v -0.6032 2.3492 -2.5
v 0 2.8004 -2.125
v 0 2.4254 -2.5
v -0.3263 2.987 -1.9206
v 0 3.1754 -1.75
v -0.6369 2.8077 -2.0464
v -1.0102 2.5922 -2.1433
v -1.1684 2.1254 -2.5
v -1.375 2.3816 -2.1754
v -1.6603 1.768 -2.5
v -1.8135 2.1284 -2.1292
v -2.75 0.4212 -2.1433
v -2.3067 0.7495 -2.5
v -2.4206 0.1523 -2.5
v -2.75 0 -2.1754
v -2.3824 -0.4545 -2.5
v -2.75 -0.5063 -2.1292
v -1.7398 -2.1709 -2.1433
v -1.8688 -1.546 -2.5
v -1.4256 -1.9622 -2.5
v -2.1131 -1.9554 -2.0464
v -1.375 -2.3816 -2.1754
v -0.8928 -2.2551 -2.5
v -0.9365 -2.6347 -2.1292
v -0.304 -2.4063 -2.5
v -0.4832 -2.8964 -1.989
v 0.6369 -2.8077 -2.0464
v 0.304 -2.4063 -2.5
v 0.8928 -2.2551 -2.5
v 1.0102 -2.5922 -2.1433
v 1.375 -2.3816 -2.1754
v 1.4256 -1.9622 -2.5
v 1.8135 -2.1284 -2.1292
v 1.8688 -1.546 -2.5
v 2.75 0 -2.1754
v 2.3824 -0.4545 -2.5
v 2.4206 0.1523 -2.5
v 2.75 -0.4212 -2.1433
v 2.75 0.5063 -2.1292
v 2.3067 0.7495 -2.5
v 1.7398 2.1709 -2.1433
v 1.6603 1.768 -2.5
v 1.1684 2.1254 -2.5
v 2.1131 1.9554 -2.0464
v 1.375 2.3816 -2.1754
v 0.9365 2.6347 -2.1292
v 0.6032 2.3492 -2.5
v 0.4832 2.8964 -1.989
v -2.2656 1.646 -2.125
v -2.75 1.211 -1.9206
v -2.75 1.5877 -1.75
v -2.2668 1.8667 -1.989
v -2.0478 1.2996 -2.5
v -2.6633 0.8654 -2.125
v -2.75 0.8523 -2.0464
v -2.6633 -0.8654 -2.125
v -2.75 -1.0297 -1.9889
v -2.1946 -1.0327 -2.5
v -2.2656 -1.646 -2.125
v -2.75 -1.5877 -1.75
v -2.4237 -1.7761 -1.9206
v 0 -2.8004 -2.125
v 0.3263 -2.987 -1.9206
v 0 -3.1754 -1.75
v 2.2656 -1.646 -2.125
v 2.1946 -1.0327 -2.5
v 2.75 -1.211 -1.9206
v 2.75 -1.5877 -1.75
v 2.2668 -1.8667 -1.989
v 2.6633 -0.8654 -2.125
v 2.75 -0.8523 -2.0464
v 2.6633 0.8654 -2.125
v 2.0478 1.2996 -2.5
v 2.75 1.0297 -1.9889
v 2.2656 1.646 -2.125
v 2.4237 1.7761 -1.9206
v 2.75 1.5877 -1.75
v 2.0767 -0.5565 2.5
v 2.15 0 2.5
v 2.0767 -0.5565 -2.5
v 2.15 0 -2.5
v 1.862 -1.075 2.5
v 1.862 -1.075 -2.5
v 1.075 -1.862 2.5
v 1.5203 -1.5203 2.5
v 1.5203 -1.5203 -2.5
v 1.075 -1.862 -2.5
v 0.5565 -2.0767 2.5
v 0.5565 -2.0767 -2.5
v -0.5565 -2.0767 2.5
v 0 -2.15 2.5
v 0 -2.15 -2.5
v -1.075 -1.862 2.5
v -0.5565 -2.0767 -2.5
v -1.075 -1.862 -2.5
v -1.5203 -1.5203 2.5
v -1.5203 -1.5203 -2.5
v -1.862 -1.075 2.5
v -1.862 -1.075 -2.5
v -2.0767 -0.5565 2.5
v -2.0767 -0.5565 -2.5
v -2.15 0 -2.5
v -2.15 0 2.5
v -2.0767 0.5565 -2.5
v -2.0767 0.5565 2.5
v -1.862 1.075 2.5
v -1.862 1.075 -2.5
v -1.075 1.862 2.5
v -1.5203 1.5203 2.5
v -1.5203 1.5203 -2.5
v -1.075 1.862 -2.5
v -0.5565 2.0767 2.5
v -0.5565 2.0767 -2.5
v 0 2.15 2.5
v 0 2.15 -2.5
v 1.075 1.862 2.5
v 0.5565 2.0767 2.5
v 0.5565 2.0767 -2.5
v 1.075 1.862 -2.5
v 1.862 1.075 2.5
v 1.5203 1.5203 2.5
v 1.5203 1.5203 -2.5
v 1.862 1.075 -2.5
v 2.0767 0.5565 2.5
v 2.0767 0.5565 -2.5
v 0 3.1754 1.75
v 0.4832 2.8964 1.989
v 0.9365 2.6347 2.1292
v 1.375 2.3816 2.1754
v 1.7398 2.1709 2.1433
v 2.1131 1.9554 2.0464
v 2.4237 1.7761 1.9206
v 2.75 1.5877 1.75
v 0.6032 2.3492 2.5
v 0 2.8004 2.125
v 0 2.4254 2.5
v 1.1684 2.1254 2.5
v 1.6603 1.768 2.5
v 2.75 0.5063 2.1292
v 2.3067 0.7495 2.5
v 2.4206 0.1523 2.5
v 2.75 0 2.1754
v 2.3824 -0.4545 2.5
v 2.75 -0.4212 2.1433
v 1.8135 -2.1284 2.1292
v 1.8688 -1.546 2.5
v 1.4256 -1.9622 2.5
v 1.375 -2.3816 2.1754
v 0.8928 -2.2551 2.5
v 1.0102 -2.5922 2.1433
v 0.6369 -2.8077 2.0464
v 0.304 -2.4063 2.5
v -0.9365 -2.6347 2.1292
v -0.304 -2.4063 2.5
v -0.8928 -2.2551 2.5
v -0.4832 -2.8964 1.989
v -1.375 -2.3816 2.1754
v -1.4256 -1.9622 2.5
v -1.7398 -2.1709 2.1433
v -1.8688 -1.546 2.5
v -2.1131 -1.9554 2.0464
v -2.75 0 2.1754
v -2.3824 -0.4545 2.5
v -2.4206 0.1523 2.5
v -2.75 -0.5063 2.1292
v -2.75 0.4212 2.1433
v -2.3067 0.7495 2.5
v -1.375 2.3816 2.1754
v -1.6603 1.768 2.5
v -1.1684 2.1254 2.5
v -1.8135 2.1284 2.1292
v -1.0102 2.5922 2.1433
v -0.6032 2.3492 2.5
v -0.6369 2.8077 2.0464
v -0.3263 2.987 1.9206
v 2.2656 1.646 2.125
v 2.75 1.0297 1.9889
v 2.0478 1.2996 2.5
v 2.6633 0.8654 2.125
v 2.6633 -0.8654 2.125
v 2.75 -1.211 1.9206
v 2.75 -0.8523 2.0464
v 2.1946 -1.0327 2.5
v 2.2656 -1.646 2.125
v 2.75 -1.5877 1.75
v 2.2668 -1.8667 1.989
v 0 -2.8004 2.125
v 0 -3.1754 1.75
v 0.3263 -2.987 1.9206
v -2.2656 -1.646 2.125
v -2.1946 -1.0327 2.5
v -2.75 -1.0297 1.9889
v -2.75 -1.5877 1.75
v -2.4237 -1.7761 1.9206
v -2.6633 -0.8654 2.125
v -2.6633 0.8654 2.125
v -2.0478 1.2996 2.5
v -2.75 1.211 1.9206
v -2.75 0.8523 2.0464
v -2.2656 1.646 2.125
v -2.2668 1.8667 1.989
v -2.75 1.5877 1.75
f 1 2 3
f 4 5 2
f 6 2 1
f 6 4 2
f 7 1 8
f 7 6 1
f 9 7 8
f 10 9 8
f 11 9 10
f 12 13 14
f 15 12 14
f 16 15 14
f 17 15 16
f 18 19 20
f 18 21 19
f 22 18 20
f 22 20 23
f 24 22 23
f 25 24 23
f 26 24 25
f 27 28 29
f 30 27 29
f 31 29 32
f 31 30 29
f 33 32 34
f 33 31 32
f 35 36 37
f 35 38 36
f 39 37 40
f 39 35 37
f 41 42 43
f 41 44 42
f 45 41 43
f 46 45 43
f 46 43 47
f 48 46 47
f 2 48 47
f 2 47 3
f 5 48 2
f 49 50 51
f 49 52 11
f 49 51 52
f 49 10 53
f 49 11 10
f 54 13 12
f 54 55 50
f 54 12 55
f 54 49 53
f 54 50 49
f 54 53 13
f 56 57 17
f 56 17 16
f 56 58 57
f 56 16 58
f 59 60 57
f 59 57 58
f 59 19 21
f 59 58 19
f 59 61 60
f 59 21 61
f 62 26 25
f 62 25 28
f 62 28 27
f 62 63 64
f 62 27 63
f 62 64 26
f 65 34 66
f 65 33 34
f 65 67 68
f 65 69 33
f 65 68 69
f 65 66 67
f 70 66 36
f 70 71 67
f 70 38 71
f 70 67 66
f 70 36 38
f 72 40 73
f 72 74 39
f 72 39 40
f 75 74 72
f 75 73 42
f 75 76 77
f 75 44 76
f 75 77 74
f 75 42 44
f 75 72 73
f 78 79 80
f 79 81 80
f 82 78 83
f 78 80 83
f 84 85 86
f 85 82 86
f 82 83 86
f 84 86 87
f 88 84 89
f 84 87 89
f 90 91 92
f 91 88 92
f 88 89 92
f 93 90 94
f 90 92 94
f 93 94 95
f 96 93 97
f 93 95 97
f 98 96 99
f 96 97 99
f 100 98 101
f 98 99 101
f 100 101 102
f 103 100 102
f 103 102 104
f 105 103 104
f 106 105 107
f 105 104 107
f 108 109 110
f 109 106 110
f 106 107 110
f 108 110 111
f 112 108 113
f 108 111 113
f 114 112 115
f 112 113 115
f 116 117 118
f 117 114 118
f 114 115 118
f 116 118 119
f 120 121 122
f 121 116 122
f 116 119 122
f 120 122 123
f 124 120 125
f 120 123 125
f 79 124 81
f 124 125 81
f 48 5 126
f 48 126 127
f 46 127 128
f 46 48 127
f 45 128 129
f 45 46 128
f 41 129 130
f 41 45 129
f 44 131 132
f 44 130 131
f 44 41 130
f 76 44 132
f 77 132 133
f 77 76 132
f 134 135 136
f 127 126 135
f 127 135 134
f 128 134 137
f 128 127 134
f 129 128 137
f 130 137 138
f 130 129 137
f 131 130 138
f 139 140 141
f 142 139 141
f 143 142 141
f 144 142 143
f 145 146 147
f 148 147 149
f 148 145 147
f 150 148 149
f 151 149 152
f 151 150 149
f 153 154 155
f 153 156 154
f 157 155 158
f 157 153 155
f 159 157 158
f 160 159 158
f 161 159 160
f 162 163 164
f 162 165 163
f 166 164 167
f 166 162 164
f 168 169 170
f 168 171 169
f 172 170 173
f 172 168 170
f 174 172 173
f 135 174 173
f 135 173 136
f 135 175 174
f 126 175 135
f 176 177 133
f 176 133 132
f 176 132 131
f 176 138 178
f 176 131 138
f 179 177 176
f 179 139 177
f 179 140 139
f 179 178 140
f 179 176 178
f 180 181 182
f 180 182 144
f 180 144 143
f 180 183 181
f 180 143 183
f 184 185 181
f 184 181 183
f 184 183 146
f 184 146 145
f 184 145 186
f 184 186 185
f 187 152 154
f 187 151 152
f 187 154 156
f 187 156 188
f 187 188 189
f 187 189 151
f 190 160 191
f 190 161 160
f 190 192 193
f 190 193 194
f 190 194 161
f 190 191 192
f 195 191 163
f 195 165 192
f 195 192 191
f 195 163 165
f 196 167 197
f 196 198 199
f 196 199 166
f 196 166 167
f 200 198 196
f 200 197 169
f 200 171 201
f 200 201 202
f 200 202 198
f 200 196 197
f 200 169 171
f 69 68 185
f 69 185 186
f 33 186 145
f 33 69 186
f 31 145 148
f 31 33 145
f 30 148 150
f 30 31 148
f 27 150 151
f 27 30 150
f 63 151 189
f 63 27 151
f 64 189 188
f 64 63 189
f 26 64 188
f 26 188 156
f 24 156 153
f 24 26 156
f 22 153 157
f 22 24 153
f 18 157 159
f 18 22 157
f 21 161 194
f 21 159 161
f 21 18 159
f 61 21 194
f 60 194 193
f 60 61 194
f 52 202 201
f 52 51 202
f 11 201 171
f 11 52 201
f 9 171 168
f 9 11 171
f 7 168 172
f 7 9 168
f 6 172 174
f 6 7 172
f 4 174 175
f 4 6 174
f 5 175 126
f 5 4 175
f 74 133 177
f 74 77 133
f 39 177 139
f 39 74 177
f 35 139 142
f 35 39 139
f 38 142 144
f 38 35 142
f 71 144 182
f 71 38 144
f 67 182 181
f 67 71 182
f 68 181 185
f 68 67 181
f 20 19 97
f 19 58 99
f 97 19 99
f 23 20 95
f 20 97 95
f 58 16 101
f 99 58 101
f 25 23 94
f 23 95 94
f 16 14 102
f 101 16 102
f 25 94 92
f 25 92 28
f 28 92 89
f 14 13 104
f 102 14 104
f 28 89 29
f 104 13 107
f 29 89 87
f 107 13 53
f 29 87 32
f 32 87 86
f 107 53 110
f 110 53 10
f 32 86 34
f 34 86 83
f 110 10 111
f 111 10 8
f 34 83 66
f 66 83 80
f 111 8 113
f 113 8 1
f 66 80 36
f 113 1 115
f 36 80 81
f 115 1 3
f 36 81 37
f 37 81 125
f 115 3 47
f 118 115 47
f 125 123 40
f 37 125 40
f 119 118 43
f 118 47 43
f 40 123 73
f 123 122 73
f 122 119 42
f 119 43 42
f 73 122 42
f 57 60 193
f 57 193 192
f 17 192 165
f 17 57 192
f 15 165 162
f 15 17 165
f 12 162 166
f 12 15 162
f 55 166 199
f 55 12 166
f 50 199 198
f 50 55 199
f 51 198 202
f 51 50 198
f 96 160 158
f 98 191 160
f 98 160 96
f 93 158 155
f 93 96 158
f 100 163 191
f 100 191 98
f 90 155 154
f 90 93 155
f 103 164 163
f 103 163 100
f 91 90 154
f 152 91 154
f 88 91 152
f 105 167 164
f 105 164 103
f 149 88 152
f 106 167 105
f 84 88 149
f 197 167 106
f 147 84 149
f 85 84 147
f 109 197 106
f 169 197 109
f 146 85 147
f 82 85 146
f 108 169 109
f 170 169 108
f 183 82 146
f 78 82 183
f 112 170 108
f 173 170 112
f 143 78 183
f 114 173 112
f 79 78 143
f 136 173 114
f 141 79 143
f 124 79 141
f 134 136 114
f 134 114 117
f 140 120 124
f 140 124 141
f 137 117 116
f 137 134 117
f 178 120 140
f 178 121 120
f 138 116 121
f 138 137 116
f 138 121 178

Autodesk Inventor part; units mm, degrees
ref_plane "YZ Plane" through (0, 0, 0) normal (1, 0, 0) x (0, 1, 0)
ref_plane "XZ Plane" through (0, 0, 0) normal (0, 1, 0) x (-1, 0, 0)
ref_plane "XY Plane" through (0, 0, 0) normal (0, 0, 1) x (1, 0, 0)
sketch "Sketch1" plane through (0, 0, 0) normal (0, 0, 1) x (1, 0, 0)
  circle A0 centre (0, 0) radius 2.15
  circle A1 centre (0, 0) radius 2.75
  line L0 (0, 3.1754) -> (2.75, 1.5877)
  line L1 (2.75, 1.5877) -> (2.75, -1.5877)
  line L2 (2.75, -1.5877) -> (0, -3.1754)
  line L3 (0, -3.1754) -> (-2.75, -1.5877)
  line L4 (-2.75, -1.5877) -> (-2.75, 1.5877)
  line L5 (-2.75, 1.5877) -> (0, 3.1754)
  dimension "d0" = 4.3
  dimension "d1" = 5.5
extrude "Extrusion1" add sketch "Sketch1" along normal mid plane 5
sketch "Sketch2" plane through (0, 0, 0) normal (1, 0, 0) x (0, 1, 0)
  line L0 (3.1754, 2.5) -> (1.5877, 2.5) projected
  line L1 (3.1754, 2.5) -> (3.1754, 1.75)
  line L2 (3.1754, 2.5) -> (2.4254, 2.5)
  line L3 (2.4254, 2.5) -> (3.1754, 1.75)
  line L4 (1.5877, 2.5) -> (-1.5877, 2.5) projected
  line L5 (0, 2.5) -> (0, -2.5) construction
  line L6 (2.15, -2.5) -> (-2.15, -2.5) projected
  line L7 (1.5877, -2.5) -> (3.1754, -2.5) projected
  line L8 (3.1754, -2.5) -> (3.1754, -1.75)
  line L9 (3.1754, -2.5) -> (2.4254, -2.5)
  line L10 (2.4254, -2.5) -> (3.1754, -1.75)
  point P0 (0, 0)
  dimension "d4" = 0.75
  dimension "d5" = 0.75
  dimension "d6" = 0.75
  dimension "d7" = 0.75
revolve "Revolution1" cut sketch "Sketch2" angle 360 about axis through (0, 0, 2.5) along (0, 0, -1)
thread "Thread3" size "M4.5x0.75" class "6H" standard "ANSI Metric M Profile" length 5
properties part number "L3 Part 7" material "Stainless Steel"
